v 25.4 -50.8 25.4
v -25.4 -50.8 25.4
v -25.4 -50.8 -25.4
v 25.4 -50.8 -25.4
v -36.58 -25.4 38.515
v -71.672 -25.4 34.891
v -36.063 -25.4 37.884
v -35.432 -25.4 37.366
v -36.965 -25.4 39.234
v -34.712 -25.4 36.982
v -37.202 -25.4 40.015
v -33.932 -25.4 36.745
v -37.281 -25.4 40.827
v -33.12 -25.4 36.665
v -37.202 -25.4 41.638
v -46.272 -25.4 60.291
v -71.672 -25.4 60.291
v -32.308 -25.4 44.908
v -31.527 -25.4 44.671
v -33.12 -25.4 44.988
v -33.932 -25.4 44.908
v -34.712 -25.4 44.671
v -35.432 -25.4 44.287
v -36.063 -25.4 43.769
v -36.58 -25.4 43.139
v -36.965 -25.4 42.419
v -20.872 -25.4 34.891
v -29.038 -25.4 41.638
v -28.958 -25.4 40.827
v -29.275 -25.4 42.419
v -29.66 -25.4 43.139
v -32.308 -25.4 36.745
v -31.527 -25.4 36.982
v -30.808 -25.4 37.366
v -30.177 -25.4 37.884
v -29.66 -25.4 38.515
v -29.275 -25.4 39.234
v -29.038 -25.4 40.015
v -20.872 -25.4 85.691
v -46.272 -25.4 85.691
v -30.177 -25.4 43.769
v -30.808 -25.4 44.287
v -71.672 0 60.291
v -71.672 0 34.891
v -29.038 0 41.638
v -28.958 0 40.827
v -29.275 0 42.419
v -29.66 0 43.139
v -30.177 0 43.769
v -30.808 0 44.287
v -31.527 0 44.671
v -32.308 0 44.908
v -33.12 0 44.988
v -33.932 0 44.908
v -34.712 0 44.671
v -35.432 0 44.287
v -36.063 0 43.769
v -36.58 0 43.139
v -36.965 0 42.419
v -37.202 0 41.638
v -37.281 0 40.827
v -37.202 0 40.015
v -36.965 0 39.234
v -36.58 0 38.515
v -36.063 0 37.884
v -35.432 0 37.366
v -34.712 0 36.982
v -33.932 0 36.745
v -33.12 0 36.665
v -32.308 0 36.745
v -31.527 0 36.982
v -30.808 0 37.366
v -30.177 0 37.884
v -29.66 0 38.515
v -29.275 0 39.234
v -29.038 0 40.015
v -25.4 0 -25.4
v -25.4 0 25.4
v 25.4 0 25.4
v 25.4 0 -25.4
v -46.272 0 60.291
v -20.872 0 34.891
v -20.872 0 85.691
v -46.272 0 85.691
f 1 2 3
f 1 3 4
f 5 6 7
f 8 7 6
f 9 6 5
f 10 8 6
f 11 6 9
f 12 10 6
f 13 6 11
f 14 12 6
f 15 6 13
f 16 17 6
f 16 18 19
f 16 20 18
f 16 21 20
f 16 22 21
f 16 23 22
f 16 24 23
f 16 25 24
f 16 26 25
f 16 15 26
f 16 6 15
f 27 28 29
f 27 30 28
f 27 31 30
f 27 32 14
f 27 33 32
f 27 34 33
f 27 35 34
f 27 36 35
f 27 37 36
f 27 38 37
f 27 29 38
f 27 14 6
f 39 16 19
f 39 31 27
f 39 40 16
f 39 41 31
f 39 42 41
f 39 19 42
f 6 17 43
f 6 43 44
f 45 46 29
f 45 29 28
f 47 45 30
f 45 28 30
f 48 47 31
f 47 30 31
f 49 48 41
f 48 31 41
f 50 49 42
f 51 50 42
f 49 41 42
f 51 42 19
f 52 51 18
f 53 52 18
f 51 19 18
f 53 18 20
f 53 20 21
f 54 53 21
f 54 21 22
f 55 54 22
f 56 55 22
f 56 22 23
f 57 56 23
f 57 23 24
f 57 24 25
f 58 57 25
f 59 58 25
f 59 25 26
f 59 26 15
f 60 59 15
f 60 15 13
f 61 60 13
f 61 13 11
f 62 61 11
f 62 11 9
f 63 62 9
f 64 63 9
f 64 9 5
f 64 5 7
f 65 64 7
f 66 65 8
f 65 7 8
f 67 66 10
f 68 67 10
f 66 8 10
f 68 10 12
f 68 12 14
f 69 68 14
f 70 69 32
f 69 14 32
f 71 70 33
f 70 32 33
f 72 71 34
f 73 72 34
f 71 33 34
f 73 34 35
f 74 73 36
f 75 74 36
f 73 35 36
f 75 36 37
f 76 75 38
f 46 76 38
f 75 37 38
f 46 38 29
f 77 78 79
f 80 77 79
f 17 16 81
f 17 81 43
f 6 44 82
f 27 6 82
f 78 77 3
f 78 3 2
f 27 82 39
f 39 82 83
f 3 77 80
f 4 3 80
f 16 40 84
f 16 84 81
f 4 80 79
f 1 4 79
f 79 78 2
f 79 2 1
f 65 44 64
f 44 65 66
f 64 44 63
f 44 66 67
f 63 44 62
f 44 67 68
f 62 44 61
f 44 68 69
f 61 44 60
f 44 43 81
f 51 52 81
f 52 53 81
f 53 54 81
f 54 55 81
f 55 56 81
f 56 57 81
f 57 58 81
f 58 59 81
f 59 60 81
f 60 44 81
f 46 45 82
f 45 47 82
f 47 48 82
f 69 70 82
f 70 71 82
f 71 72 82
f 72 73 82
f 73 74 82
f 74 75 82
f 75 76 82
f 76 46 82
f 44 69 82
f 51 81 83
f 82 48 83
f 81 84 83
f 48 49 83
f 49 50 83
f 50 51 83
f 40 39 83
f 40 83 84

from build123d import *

# Parameters (mm, degrees)
F0_W     = 50.8
F0_H     = 50.8
F1_DEPTH = 50.8
F3_DEPTH = 25.4
F4_R     = 4.161619
F5_DEPTH = 75.946


with BuildPart() as f1:
    # F0 (on Front) → F1 (new body)
    with BuildSketch(Plane.XZ):
        Rectangle(F0_W, F0_H)
    extrude(amount=F1_DEPTH)


with BuildPart() as f3:
    # F2 (on Front) → F3 (new body)
    with BuildSketch(Plane.XZ):
        Polygon((-46.272175, 60.291409), (-71.672175, 60.291409), (-71.672175, 34.891409), (-20.872175, 34.891409), (-20.872175, 85.691409), (-46.272175, 85.691409), align=None)
    extrude(amount=F3_DEPTH)

    # F4 (on face) → F5 (cut)
    with BuildSketch(Plane.XZ.offset(25.4)):
        with Locations((-33.11985, 40.8266)):
            Circle(F4_R)
    extrude(amount=-F5_DEPTH, mode=Mode.SUBTRACT)


solid = Compound([f1.part, f3.part])
